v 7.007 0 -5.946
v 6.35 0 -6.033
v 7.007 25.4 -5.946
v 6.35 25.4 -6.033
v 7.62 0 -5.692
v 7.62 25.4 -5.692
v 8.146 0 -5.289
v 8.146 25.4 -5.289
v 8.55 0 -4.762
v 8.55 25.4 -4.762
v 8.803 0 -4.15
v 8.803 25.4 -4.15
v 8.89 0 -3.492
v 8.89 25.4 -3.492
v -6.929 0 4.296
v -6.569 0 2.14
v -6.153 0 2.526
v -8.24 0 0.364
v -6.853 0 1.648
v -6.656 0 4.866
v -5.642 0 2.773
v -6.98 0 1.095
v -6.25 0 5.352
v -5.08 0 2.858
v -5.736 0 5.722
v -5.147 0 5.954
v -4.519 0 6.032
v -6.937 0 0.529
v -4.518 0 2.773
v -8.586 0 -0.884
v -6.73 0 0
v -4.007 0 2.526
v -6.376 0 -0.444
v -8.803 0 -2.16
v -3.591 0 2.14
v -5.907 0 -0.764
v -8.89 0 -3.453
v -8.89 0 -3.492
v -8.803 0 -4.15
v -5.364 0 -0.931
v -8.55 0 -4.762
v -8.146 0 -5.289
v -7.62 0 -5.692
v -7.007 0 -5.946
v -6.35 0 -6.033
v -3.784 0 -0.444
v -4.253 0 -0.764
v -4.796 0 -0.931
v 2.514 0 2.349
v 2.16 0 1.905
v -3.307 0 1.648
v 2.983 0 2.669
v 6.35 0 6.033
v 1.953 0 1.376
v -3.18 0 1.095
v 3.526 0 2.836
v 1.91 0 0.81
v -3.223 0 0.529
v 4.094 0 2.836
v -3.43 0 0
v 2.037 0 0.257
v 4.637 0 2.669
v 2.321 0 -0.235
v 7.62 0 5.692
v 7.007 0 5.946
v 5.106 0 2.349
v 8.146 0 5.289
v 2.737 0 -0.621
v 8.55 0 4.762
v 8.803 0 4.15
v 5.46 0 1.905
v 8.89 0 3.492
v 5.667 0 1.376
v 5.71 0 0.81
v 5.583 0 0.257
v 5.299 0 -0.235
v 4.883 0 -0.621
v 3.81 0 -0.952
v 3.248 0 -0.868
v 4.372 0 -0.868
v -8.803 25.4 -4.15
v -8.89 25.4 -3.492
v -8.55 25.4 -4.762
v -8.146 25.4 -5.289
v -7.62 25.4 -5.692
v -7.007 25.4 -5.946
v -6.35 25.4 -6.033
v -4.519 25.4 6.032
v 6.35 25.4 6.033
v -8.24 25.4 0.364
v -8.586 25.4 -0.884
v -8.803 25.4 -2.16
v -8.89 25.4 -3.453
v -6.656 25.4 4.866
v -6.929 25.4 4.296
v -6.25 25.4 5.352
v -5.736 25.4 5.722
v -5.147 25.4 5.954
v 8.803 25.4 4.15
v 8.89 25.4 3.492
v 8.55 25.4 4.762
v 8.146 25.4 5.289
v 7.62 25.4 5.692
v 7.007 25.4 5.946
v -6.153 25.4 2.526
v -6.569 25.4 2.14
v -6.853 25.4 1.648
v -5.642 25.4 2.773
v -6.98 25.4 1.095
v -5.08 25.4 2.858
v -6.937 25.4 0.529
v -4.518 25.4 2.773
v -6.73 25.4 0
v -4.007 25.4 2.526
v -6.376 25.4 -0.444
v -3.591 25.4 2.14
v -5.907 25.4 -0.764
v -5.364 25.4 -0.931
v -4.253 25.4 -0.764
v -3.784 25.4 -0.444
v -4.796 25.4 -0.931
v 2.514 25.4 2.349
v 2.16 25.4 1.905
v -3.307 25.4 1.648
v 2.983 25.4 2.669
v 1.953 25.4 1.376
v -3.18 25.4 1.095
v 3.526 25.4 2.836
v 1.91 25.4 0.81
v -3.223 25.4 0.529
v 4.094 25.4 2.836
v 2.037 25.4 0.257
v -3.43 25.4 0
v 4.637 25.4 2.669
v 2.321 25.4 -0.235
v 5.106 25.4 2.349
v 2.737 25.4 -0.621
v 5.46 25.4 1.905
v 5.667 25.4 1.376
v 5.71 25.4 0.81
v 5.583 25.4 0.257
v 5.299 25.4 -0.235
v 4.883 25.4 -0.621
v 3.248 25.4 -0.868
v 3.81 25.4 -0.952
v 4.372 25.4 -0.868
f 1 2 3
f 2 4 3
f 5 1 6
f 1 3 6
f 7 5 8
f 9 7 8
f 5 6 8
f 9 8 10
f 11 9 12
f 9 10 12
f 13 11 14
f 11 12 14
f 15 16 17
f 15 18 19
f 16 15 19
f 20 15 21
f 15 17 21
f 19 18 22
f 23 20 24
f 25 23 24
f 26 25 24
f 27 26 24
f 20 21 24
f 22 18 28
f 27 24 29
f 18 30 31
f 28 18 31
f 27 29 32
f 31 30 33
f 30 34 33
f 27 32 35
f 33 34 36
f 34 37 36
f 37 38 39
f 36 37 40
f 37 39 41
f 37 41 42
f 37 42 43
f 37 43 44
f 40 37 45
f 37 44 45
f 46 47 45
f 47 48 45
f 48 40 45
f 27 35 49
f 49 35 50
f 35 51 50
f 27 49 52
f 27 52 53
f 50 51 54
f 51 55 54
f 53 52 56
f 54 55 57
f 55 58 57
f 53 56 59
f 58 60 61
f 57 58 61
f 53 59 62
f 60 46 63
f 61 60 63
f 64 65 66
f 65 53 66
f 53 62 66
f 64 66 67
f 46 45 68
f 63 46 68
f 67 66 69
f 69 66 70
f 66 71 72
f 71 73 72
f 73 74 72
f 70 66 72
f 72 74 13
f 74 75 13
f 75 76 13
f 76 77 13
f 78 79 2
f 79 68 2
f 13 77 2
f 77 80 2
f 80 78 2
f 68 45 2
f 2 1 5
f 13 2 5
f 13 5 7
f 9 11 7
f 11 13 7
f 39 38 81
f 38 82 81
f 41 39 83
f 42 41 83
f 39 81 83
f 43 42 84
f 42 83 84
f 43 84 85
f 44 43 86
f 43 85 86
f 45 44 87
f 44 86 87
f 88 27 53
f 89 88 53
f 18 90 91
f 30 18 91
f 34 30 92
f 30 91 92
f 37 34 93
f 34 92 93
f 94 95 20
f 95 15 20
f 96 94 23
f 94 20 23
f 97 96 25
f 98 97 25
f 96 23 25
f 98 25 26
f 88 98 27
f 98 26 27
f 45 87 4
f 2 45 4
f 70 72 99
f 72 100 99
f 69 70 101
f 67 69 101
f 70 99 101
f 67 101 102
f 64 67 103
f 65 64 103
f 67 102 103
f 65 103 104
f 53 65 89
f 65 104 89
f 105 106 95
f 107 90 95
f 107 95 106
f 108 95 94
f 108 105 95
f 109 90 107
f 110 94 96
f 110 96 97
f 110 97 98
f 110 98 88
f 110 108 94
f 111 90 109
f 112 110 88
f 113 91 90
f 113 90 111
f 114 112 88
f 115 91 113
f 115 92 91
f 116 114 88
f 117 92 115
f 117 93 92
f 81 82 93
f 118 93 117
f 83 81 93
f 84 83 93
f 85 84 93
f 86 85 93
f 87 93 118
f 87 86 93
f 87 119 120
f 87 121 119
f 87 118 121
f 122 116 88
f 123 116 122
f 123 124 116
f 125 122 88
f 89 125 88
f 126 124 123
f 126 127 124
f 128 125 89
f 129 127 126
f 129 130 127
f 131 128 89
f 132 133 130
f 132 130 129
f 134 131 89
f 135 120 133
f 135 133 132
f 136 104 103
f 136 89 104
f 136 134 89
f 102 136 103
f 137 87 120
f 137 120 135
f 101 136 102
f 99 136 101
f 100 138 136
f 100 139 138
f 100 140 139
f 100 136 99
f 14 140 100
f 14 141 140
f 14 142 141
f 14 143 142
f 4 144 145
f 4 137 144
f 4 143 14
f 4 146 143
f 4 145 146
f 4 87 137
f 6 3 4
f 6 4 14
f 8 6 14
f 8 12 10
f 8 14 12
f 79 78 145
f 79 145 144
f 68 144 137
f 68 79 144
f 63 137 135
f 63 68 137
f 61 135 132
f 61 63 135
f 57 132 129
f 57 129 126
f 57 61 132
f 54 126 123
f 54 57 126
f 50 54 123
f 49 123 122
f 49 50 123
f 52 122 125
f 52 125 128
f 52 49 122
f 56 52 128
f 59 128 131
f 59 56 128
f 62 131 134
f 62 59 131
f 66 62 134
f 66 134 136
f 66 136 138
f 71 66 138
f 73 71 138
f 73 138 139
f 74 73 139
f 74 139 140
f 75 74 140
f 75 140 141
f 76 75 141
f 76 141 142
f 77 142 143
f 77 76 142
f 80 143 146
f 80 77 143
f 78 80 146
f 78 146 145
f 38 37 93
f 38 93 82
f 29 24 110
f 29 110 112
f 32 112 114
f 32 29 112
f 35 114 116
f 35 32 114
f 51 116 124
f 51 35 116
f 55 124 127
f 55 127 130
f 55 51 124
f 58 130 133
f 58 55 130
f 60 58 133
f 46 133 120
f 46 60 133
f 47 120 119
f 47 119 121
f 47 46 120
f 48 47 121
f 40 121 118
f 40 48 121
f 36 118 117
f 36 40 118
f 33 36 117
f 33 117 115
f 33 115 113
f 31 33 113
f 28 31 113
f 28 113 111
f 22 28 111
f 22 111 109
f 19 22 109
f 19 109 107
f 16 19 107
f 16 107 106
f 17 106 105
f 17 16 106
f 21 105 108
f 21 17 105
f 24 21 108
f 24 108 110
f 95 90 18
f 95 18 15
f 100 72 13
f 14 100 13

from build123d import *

# Parameters (mm, degrees)
SKETCH1_W           = 17.78
SKETCH1_H           = 12.065
SKETCH1_R           = 1.905
BOSS_EXTRUDE1_DEPTH = 25.4
CUT_EXTRUDE1_DEPTH  = 28.578672126
FILLET1_R           = 2.54
FILLET2_R           = 12.7


with BuildPart() as part:
    # Sketch1 → Boss-Extrude1 (new body)
    with BuildSketch(Plane(origin=(0, 0, 0), x_dir=(1, 0, 0), z_dir=(0, 1, 0))):
        Rectangle(SKETCH1_W, SKETCH1_H)
        with Locations(Location((-5.08, -0.9525, 0), (0, 0, 270))):
            Circle(SKETCH1_R, mode=Mode.SUBTRACT)
        with Locations(Location((3.81, -0.9525, 0), (0, 0, 90))):
            Circle(SKETCH1_R, mode=Mode.SUBTRACT)
    extrude(amount=BOSS_EXTRUDE1_DEPTH)

    # Sketch2 → Cut-Extrude1 (cut, through all)
    with BuildSketch(Plane(origin=(0, 25.4, 0), x_dir=(1, 0, 0), z_dir=(0, 1, 0))):
        Polygon((-8.89, 1.5875), (-6.35, -6.0325), (-8.89, -6.0325), align=None)
    extrude(amount=-CUT_EXTRUDE1_DEPTH, mode=Mode.SUBTRACT)

    # Fillet1
    fillet1_edges = [part.edges().sort_by_distance(p)[0] for p in [
        (-6.35, 12.7, 6.0325),
        (8.89, 12.7, 6.0325),
        (-8.89, 12.7, -6.0325),
        (8.89, 12.7, -6.0325),
    ]]
    fillet(fillet1_edges, radius=FILLET1_R)

    # Fillet2
    # the kernel refuses this fillet: 12.7 mm, written as the material it takes off along each edge
    with BuildSketch(Plane(origin=(-8.89, 30.542393541, -1.5875), x_dir=(0.00016823247484796397, 0, -0.9999999858489171), z_dir=(0, -1, 0))) as fillet2_piece_1:
        with BuildLine():
            CenterArc((2.066827795, 12.698397406), FILLET2_R, 251.555412166, 17.534355835)
            Line((-1.951291688, 0.650795328), (-2.353103637, -0.553964879))
            Line((-2.353103637, -0.553964879), (-0.401811948, -1.204760208))
            Line((-0.401811948, -1.204760208), (-0.000213655, -1.269999982))
            ThreePointArc((-0.000213655, -1.269999982), (1.904786318, -1.270320465), (1.844902092, -1.269839741))
            Line((1.844902092, -1.269839741), (1.865077156, 0))
        make_face()
    extrude(amount=35.684787082, mode=Mode.SUBTRACT)


solid = part.part
